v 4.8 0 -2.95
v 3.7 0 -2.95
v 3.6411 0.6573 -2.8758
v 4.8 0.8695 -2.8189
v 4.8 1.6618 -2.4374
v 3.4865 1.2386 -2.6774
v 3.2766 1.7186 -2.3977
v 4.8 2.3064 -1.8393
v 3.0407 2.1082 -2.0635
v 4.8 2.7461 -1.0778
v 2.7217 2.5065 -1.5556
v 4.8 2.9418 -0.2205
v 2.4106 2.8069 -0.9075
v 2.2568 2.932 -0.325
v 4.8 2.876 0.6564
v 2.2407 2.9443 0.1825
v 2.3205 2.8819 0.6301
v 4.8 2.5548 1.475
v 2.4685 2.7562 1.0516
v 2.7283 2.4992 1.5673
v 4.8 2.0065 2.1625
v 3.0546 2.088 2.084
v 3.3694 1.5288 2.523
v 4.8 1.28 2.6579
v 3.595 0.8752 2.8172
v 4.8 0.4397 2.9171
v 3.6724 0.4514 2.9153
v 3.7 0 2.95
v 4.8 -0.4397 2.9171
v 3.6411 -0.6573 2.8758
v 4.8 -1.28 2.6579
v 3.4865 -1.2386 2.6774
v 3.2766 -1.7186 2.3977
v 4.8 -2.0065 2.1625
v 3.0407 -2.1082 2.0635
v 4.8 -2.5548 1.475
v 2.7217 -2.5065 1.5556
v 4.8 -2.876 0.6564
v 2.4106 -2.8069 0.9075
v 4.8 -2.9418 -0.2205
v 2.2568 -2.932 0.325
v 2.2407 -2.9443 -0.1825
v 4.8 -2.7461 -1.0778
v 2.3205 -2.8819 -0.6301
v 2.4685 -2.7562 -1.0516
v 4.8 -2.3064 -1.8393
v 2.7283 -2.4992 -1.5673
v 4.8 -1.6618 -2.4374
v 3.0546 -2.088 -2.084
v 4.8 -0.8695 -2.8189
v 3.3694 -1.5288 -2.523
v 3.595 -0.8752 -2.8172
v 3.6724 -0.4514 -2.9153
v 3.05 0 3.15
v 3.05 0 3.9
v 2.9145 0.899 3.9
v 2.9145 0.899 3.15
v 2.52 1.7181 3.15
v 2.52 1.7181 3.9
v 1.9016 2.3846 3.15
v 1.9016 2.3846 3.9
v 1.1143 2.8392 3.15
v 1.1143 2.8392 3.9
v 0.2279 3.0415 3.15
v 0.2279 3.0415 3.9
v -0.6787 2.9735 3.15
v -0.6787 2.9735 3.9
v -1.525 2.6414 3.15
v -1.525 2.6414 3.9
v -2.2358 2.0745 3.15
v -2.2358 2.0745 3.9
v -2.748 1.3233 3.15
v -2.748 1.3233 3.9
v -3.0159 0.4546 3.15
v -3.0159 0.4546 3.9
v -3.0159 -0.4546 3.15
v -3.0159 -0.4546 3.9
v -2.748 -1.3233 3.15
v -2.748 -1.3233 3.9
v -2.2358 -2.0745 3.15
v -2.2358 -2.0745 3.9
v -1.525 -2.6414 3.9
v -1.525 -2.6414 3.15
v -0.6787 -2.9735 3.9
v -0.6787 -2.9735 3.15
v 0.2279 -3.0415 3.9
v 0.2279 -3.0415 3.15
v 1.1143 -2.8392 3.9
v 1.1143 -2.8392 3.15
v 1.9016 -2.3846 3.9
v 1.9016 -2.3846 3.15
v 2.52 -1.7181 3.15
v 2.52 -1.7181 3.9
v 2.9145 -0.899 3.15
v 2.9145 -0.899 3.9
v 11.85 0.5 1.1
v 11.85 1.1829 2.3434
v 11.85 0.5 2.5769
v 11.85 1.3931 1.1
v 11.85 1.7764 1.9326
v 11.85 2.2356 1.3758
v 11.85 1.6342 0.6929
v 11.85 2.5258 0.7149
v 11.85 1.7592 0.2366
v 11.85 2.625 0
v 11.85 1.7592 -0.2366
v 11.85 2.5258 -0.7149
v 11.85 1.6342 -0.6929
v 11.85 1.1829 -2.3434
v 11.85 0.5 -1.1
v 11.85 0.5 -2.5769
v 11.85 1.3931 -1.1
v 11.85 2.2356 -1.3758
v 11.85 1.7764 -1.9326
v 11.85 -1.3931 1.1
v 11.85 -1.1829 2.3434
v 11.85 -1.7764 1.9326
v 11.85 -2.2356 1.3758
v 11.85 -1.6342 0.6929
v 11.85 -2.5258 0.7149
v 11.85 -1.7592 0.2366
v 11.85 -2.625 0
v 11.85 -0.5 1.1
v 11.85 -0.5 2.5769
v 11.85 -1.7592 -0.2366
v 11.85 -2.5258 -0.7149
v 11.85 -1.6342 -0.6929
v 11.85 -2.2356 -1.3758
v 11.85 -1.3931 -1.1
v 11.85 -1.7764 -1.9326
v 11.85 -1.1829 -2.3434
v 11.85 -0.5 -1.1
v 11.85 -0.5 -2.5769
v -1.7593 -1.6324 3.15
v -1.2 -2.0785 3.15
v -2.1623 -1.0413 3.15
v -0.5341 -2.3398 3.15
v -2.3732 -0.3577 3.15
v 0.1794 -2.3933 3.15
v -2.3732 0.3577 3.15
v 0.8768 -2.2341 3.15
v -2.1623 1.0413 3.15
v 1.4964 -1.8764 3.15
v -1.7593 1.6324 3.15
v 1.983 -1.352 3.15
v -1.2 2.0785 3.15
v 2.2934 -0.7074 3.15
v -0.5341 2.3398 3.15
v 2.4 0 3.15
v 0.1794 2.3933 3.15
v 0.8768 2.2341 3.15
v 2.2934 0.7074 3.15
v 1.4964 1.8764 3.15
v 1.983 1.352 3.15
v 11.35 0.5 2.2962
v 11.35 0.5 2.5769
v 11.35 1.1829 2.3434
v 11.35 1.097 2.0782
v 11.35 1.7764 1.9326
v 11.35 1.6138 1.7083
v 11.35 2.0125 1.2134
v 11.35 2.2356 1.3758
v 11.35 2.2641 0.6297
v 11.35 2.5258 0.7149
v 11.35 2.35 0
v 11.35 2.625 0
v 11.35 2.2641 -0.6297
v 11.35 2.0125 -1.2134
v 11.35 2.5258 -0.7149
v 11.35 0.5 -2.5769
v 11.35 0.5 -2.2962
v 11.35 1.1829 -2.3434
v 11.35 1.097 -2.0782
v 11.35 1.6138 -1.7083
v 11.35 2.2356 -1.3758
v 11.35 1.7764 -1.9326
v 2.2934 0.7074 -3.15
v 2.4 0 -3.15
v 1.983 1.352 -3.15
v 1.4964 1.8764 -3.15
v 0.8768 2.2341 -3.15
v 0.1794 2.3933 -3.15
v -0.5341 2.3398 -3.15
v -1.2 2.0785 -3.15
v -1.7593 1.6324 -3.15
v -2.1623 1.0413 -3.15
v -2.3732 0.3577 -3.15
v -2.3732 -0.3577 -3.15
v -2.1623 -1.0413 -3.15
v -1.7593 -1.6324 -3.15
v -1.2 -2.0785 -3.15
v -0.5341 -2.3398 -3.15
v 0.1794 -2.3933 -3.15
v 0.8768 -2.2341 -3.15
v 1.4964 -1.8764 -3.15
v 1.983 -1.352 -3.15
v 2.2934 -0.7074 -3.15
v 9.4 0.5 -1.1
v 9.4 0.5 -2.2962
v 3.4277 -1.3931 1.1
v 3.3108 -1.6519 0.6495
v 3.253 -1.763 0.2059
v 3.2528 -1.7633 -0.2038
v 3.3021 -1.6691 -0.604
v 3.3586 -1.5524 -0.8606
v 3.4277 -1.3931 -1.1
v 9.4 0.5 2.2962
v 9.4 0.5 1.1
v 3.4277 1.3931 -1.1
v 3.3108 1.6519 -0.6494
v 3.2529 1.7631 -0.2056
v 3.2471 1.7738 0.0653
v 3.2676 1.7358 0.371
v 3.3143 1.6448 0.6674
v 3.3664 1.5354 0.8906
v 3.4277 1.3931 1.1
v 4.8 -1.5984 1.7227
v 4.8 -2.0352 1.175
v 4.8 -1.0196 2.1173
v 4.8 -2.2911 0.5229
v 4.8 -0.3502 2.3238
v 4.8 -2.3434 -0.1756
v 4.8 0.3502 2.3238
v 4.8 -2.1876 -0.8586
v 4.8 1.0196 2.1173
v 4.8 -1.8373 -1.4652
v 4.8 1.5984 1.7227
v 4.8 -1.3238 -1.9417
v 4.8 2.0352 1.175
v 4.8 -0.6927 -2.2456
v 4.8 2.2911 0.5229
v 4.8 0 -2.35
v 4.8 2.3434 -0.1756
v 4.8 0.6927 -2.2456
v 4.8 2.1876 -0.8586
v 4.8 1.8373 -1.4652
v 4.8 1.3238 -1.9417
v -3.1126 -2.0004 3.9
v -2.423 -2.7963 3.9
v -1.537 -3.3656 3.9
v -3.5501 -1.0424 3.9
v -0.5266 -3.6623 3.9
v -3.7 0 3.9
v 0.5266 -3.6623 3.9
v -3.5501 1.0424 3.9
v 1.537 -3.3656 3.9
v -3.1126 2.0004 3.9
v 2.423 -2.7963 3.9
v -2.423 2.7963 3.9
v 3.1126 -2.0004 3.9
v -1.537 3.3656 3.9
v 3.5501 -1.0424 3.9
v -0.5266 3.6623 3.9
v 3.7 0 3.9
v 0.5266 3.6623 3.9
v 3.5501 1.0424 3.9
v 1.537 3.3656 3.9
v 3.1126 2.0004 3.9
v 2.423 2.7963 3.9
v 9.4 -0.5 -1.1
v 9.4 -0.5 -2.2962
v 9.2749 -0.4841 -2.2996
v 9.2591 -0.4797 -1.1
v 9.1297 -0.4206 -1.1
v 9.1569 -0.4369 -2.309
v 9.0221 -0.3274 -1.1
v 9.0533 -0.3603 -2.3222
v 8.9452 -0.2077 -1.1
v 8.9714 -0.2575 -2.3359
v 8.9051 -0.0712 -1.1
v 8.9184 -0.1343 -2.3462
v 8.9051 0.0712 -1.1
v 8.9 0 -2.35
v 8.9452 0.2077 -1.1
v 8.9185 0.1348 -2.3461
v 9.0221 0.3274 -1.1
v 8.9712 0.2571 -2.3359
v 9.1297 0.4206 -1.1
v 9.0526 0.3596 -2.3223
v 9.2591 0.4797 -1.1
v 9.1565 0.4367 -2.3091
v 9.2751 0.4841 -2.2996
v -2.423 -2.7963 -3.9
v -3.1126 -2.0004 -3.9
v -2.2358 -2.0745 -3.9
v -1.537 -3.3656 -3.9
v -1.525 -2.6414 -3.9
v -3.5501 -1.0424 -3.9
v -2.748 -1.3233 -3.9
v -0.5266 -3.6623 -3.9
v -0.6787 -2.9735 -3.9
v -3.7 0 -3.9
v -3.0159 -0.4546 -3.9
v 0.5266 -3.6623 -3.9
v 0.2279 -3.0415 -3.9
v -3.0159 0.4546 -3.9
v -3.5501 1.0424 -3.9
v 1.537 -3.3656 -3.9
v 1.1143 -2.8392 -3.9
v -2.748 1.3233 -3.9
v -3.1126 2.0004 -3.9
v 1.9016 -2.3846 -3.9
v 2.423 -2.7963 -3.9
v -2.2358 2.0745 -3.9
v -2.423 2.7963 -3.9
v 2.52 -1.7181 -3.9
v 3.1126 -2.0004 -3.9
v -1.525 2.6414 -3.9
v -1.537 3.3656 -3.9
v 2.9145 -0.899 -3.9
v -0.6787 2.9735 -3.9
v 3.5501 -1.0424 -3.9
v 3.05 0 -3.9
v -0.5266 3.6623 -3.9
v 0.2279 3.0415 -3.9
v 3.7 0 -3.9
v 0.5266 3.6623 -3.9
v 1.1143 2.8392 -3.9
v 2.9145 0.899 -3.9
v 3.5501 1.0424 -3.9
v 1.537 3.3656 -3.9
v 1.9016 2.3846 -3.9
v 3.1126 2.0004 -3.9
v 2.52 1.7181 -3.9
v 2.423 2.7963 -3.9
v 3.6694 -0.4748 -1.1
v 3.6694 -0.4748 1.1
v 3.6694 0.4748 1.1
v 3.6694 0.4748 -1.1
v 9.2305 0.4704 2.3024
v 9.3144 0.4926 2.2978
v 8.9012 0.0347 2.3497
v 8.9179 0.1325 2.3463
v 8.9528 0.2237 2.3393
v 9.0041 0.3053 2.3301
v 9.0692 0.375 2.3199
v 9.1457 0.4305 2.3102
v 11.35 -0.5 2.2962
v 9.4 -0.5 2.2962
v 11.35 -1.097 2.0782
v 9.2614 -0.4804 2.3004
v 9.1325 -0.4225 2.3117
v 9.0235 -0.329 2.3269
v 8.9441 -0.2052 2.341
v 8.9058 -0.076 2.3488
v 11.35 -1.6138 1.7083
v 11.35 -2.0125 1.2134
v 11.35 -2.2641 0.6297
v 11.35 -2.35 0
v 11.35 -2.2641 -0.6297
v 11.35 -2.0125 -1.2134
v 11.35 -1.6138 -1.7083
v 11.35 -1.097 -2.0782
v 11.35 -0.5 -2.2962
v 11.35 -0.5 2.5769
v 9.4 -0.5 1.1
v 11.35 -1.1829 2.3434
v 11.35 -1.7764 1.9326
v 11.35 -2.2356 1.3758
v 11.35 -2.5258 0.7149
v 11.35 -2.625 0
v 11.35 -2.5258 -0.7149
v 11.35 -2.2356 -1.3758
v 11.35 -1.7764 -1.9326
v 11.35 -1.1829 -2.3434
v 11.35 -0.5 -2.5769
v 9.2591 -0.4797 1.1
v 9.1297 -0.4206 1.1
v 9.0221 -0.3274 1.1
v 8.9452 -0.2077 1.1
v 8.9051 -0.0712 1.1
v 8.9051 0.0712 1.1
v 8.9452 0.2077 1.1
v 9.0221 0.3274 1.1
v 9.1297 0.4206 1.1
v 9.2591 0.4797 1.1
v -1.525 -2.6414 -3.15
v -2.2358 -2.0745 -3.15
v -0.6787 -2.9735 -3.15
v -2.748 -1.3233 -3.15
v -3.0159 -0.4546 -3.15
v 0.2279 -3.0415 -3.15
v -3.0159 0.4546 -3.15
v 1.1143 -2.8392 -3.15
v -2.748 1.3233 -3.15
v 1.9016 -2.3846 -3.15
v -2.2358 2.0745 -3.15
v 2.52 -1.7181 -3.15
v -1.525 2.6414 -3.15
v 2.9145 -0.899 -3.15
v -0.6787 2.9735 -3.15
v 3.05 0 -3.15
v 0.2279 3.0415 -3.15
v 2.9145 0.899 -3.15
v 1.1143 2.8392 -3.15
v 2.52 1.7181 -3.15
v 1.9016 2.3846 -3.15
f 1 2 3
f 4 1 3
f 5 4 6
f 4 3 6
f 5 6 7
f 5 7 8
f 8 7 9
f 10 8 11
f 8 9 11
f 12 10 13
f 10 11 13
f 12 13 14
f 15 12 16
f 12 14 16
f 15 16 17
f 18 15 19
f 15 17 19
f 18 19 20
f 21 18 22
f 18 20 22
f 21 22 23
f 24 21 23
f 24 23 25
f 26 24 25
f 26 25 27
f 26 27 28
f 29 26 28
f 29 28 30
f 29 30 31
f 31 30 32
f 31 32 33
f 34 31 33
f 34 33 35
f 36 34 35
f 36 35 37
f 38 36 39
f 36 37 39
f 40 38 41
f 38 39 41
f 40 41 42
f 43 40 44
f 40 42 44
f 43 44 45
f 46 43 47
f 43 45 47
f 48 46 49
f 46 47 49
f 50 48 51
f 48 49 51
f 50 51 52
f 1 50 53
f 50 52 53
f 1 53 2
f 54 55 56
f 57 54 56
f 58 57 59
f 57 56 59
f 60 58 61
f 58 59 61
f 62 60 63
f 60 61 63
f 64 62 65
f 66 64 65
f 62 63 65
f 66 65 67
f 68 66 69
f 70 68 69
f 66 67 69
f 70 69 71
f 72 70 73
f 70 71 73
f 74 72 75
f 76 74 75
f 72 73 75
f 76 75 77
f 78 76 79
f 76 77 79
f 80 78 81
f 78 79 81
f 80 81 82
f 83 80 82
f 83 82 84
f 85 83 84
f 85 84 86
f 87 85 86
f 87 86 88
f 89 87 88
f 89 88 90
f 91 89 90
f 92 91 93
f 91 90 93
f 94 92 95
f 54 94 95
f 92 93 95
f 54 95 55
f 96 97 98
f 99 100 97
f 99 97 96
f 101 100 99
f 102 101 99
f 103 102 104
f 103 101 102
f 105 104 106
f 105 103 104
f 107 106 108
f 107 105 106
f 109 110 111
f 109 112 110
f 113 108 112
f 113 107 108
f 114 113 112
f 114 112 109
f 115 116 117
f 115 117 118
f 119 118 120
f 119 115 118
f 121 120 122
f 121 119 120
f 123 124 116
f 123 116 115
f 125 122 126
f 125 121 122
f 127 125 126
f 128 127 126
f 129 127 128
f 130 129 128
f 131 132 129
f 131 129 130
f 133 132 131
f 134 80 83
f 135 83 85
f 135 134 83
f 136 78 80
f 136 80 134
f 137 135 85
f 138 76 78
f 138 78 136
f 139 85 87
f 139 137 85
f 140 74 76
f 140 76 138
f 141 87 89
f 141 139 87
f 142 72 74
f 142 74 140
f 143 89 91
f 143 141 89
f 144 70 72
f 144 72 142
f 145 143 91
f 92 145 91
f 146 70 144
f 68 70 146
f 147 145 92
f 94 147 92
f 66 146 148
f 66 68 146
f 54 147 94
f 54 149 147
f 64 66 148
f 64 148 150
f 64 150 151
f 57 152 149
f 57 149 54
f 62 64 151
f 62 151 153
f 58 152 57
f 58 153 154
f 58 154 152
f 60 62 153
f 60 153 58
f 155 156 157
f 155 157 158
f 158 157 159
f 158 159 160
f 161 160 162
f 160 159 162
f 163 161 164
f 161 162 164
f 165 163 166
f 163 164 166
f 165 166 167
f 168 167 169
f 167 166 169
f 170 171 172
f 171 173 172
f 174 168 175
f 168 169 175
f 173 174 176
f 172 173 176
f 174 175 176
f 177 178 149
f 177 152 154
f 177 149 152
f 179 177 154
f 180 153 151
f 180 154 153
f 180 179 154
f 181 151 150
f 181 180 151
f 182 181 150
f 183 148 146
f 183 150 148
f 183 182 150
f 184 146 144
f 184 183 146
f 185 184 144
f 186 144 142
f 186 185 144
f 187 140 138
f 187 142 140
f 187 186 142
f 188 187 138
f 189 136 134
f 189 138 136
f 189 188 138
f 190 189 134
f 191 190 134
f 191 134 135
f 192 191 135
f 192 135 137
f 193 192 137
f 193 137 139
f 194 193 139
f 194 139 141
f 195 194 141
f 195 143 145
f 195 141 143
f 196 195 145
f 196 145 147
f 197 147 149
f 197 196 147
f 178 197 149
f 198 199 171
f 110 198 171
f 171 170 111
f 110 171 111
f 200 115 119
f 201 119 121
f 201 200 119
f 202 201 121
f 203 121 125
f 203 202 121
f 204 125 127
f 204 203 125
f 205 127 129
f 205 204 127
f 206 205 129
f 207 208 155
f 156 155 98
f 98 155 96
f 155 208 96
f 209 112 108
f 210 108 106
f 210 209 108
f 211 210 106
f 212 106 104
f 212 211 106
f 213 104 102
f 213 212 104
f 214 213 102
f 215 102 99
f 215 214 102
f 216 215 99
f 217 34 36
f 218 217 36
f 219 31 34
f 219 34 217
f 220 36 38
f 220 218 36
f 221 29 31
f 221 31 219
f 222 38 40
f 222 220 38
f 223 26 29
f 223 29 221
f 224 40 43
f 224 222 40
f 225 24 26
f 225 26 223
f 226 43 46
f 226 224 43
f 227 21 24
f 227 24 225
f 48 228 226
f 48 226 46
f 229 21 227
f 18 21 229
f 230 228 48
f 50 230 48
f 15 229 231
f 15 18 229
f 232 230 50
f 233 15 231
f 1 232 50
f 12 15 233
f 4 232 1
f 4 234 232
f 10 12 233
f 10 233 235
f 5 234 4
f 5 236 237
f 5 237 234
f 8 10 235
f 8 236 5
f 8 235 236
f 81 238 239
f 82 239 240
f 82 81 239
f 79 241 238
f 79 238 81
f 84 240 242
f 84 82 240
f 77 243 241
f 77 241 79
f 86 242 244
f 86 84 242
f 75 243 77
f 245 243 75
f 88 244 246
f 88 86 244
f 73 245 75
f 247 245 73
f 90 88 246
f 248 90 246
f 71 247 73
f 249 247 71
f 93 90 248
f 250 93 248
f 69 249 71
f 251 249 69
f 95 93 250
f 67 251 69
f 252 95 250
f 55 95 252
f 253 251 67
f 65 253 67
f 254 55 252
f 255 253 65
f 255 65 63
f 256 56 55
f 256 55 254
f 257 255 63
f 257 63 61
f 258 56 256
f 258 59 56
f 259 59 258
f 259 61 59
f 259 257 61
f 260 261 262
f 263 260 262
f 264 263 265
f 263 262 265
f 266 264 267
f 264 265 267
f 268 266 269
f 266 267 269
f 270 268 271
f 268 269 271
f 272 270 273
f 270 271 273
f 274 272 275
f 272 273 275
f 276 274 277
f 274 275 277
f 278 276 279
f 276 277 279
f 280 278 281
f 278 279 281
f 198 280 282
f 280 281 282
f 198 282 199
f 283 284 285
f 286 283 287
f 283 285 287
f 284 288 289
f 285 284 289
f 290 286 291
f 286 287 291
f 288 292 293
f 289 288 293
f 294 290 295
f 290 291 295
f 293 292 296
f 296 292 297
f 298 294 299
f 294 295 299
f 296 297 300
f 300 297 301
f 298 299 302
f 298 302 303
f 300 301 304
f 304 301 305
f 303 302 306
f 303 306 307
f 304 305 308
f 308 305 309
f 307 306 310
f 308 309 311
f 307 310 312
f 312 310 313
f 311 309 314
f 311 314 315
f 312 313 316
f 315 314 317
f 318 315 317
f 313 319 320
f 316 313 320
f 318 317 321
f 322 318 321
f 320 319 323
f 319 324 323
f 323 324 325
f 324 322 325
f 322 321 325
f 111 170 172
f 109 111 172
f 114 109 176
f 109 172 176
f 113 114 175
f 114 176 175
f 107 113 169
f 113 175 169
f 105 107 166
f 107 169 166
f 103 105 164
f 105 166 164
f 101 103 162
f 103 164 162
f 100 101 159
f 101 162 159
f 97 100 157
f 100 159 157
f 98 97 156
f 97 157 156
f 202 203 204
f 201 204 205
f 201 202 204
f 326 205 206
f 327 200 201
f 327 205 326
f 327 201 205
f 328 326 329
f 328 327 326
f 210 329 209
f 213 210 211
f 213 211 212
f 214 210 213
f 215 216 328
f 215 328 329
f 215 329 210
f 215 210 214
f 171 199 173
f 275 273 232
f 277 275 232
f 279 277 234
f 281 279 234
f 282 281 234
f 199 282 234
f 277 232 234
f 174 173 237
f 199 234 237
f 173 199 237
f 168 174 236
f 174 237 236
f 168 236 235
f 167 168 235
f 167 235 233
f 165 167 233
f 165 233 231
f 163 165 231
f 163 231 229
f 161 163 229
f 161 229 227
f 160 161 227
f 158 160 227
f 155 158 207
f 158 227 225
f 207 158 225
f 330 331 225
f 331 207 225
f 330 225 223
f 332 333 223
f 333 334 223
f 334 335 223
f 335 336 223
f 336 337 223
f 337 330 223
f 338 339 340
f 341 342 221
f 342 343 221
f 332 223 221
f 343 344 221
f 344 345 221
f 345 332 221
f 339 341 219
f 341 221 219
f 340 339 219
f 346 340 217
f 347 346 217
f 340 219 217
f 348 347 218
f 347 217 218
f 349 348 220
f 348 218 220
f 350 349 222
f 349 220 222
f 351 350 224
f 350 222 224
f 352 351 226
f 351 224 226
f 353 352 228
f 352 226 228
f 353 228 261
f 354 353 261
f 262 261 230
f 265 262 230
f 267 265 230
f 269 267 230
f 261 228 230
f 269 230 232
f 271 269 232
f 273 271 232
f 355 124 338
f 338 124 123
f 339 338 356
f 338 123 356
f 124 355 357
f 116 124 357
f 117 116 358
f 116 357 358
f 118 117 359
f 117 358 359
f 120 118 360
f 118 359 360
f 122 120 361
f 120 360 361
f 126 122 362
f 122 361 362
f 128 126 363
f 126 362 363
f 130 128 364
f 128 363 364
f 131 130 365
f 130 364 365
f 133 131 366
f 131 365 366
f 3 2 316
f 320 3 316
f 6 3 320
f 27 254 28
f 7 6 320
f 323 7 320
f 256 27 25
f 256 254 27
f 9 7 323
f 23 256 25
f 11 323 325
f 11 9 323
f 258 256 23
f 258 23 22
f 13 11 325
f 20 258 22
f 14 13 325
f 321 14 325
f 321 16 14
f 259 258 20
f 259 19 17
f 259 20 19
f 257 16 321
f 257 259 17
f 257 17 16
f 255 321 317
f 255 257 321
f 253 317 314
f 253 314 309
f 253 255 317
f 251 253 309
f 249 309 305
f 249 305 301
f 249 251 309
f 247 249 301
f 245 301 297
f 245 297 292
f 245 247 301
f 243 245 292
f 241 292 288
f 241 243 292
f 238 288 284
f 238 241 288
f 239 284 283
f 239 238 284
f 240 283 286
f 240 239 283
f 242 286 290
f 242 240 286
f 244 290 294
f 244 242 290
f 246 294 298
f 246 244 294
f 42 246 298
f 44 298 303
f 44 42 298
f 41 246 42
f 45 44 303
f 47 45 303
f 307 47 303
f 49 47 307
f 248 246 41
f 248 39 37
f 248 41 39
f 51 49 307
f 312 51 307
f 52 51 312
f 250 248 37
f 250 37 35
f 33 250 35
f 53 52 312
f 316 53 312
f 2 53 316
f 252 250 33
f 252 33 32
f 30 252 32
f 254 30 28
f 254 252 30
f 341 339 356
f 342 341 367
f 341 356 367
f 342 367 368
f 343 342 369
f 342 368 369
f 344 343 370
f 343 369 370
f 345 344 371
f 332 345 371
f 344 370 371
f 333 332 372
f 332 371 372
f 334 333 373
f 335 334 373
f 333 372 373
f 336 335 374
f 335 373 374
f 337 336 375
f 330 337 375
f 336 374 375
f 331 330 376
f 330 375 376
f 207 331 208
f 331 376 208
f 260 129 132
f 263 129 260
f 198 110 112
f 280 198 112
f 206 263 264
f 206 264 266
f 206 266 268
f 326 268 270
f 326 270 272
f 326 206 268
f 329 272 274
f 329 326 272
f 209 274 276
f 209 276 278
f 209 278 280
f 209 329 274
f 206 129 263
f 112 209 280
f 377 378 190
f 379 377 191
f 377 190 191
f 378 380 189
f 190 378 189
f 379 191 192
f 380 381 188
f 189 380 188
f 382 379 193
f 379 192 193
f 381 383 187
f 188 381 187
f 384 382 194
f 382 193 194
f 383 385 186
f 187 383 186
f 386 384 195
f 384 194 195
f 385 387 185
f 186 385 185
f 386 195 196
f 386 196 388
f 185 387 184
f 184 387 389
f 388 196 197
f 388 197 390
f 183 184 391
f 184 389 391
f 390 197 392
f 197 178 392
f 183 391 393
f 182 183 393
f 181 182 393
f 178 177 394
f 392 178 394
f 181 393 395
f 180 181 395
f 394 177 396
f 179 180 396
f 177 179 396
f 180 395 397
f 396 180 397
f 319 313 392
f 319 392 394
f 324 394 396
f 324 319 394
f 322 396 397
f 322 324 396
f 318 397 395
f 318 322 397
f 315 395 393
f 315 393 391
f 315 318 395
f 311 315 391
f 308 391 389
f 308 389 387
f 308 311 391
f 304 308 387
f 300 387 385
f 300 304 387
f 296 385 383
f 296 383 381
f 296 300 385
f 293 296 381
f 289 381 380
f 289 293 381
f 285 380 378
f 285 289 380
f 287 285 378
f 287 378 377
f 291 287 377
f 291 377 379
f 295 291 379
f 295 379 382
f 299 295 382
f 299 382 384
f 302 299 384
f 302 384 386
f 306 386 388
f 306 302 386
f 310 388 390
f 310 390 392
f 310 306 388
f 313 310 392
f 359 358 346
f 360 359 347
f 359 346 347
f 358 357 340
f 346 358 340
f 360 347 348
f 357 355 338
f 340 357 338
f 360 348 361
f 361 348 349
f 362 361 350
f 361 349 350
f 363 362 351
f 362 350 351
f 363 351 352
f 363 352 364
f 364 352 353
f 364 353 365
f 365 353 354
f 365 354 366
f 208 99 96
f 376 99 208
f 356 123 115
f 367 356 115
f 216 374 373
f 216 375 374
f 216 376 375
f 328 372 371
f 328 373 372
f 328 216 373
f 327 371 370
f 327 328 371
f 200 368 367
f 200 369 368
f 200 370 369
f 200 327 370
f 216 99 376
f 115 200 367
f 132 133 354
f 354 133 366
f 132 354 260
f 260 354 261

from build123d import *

# Parameters (mm, degrees)
SKETCH1_R              = 2.35
PIN_DEPTH              = 11.35
SKETCH2_R              = 2.95
MIDDLE_DEPTH           = 4.8
SKETCH3_R              = 2.625
OUTER_RIM_DEPTH        = 0.5
BORE_CUT_DEPTH         = 13.562941535
SLOT_CUT_DEPTH         = 13.562941535
SLOT_CUT_DEPTH_BACK    = 13.562941535
SKETCH6_R              = 3.7
MIDDLE_BODY_DEPTH      = 3.9
MIDDLE_BORE_DEPTH      = 14.012398084
MIDDLE_BORE_DEPTH_BACK = 14.012398084
SKETCH7_R              = 2.4
SKETCH8_R              = 3.05
MIDDLE_RIM_CUT_DEPTH   = 0.75


with BuildPart() as part:
    # Sketch1 → Pin (new body)
    with BuildSketch(Plane(origin=(0, 0, 0), x_dir=(0, 0, -1), z_dir=(1, 0, 0))):
        Circle(SKETCH1_R)
    extrude(amount=PIN_DEPTH)

    # Sketch2 → Middle (add)
    with BuildSketch(Plane(origin=(0, 0, 0), x_dir=(0, 0, -1), z_dir=(1, 0, 0))):
        Circle(SKETCH2_R)
    extrude(amount=MIDDLE_DEPTH)

    # Sketch3 → Outer Rim (add)
    with BuildSketch(Plane(origin=(11.35, 0, 0), x_dir=(0, 0, -1), z_dir=(1, 0, 0))):
        Circle(SKETCH3_R)
    extrude(amount=OUTER_RIM_DEPTH)

    # Sketch4 → Bore Cut (cut, through all)
    with BuildSketch(Plane(origin=(0, 0, 0), x_dir=(0, 0, -1), z_dir=(1, 0, 0))):
        with BuildLine():
            ThreePointArc((-1.1, -1.393063172), (0, -1.775), (1.1, -1.393063172))
            Line((1.1, -1.393063172), (1.1, 1.393063172))
            ThreePointArc((1.1, 1.393063172), (0, 1.775), (-1.1, 1.393063172))
            Line((-1.1, 1.393063172), (-1.1, -1.393063172))
        make_face()
    extrude(amount=BORE_CUT_DEPTH, mode=Mode.SUBTRACT)

    # Sketch5 → Slot Cut (cut, two sides: drawn at the far end of the back side and taken through both)
    with BuildSketch(Plane.XY.offset(-SLOT_CUT_DEPTH_BACK)):
        with BuildLine():
            Line((14.3, -0.5), (9.4, -0.5))
            ThreePointArc((9.4, -0.5), (8.9, 0), (9.4, 0.5))
            Line((9.4, 0.5), (14.3, 0.5))
            ThreePointArc((14.3, 0.5), (14.8, 0), (14.3, -0.5))
        make_face()
        with BuildLine():
            Line((-14.3, -0.5), (-9.4, -0.5))
            ThreePointArc((-9.4, -0.5), (-8.9, 0), (-9.4, 0.5))
            Line((-9.4, 0.5), (-14.3, 0.5))
            ThreePointArc((-14.3, 0.5), (-14.8, 0), (-14.3, -0.5))
        make_face()
    extrude(amount=SLOT_CUT_DEPTH + SLOT_CUT_DEPTH_BACK, mode=Mode.SUBTRACT)

    # Sketch6 → Middle Body (add, symmetric)
    with BuildSketch(Plane.XY):
        Circle(SKETCH6_R)
    extrude(amount=MIDDLE_BODY_DEPTH, both=True)

    # Sketch7 → Middle Bore (cut, two sides: drawn at the far end of the back side and taken through both)
    with BuildSketch(Plane.XY.offset(-MIDDLE_BORE_DEPTH_BACK)):
        Circle(SKETCH7_R)
    extrude(amount=MIDDLE_BORE_DEPTH + MIDDLE_BORE_DEPTH_BACK, mode=Mode.SUBTRACT)

    # Sketch8 → Middle Rim Cut (cut)
    with BuildSketch(Plane.XY.offset(3.9)):
        Circle(SKETCH8_R)
    middle_rim_cut = extrude(amount=-MIDDLE_RIM_CUT_DEPTH, mode=Mode.SUBTRACT)

    # Mirror2: Middle Rim Cut across plane
    add(middle_rim_cut.mirror(Plane.XY), mode=Mode.SUBTRACT)


solid = part.part
